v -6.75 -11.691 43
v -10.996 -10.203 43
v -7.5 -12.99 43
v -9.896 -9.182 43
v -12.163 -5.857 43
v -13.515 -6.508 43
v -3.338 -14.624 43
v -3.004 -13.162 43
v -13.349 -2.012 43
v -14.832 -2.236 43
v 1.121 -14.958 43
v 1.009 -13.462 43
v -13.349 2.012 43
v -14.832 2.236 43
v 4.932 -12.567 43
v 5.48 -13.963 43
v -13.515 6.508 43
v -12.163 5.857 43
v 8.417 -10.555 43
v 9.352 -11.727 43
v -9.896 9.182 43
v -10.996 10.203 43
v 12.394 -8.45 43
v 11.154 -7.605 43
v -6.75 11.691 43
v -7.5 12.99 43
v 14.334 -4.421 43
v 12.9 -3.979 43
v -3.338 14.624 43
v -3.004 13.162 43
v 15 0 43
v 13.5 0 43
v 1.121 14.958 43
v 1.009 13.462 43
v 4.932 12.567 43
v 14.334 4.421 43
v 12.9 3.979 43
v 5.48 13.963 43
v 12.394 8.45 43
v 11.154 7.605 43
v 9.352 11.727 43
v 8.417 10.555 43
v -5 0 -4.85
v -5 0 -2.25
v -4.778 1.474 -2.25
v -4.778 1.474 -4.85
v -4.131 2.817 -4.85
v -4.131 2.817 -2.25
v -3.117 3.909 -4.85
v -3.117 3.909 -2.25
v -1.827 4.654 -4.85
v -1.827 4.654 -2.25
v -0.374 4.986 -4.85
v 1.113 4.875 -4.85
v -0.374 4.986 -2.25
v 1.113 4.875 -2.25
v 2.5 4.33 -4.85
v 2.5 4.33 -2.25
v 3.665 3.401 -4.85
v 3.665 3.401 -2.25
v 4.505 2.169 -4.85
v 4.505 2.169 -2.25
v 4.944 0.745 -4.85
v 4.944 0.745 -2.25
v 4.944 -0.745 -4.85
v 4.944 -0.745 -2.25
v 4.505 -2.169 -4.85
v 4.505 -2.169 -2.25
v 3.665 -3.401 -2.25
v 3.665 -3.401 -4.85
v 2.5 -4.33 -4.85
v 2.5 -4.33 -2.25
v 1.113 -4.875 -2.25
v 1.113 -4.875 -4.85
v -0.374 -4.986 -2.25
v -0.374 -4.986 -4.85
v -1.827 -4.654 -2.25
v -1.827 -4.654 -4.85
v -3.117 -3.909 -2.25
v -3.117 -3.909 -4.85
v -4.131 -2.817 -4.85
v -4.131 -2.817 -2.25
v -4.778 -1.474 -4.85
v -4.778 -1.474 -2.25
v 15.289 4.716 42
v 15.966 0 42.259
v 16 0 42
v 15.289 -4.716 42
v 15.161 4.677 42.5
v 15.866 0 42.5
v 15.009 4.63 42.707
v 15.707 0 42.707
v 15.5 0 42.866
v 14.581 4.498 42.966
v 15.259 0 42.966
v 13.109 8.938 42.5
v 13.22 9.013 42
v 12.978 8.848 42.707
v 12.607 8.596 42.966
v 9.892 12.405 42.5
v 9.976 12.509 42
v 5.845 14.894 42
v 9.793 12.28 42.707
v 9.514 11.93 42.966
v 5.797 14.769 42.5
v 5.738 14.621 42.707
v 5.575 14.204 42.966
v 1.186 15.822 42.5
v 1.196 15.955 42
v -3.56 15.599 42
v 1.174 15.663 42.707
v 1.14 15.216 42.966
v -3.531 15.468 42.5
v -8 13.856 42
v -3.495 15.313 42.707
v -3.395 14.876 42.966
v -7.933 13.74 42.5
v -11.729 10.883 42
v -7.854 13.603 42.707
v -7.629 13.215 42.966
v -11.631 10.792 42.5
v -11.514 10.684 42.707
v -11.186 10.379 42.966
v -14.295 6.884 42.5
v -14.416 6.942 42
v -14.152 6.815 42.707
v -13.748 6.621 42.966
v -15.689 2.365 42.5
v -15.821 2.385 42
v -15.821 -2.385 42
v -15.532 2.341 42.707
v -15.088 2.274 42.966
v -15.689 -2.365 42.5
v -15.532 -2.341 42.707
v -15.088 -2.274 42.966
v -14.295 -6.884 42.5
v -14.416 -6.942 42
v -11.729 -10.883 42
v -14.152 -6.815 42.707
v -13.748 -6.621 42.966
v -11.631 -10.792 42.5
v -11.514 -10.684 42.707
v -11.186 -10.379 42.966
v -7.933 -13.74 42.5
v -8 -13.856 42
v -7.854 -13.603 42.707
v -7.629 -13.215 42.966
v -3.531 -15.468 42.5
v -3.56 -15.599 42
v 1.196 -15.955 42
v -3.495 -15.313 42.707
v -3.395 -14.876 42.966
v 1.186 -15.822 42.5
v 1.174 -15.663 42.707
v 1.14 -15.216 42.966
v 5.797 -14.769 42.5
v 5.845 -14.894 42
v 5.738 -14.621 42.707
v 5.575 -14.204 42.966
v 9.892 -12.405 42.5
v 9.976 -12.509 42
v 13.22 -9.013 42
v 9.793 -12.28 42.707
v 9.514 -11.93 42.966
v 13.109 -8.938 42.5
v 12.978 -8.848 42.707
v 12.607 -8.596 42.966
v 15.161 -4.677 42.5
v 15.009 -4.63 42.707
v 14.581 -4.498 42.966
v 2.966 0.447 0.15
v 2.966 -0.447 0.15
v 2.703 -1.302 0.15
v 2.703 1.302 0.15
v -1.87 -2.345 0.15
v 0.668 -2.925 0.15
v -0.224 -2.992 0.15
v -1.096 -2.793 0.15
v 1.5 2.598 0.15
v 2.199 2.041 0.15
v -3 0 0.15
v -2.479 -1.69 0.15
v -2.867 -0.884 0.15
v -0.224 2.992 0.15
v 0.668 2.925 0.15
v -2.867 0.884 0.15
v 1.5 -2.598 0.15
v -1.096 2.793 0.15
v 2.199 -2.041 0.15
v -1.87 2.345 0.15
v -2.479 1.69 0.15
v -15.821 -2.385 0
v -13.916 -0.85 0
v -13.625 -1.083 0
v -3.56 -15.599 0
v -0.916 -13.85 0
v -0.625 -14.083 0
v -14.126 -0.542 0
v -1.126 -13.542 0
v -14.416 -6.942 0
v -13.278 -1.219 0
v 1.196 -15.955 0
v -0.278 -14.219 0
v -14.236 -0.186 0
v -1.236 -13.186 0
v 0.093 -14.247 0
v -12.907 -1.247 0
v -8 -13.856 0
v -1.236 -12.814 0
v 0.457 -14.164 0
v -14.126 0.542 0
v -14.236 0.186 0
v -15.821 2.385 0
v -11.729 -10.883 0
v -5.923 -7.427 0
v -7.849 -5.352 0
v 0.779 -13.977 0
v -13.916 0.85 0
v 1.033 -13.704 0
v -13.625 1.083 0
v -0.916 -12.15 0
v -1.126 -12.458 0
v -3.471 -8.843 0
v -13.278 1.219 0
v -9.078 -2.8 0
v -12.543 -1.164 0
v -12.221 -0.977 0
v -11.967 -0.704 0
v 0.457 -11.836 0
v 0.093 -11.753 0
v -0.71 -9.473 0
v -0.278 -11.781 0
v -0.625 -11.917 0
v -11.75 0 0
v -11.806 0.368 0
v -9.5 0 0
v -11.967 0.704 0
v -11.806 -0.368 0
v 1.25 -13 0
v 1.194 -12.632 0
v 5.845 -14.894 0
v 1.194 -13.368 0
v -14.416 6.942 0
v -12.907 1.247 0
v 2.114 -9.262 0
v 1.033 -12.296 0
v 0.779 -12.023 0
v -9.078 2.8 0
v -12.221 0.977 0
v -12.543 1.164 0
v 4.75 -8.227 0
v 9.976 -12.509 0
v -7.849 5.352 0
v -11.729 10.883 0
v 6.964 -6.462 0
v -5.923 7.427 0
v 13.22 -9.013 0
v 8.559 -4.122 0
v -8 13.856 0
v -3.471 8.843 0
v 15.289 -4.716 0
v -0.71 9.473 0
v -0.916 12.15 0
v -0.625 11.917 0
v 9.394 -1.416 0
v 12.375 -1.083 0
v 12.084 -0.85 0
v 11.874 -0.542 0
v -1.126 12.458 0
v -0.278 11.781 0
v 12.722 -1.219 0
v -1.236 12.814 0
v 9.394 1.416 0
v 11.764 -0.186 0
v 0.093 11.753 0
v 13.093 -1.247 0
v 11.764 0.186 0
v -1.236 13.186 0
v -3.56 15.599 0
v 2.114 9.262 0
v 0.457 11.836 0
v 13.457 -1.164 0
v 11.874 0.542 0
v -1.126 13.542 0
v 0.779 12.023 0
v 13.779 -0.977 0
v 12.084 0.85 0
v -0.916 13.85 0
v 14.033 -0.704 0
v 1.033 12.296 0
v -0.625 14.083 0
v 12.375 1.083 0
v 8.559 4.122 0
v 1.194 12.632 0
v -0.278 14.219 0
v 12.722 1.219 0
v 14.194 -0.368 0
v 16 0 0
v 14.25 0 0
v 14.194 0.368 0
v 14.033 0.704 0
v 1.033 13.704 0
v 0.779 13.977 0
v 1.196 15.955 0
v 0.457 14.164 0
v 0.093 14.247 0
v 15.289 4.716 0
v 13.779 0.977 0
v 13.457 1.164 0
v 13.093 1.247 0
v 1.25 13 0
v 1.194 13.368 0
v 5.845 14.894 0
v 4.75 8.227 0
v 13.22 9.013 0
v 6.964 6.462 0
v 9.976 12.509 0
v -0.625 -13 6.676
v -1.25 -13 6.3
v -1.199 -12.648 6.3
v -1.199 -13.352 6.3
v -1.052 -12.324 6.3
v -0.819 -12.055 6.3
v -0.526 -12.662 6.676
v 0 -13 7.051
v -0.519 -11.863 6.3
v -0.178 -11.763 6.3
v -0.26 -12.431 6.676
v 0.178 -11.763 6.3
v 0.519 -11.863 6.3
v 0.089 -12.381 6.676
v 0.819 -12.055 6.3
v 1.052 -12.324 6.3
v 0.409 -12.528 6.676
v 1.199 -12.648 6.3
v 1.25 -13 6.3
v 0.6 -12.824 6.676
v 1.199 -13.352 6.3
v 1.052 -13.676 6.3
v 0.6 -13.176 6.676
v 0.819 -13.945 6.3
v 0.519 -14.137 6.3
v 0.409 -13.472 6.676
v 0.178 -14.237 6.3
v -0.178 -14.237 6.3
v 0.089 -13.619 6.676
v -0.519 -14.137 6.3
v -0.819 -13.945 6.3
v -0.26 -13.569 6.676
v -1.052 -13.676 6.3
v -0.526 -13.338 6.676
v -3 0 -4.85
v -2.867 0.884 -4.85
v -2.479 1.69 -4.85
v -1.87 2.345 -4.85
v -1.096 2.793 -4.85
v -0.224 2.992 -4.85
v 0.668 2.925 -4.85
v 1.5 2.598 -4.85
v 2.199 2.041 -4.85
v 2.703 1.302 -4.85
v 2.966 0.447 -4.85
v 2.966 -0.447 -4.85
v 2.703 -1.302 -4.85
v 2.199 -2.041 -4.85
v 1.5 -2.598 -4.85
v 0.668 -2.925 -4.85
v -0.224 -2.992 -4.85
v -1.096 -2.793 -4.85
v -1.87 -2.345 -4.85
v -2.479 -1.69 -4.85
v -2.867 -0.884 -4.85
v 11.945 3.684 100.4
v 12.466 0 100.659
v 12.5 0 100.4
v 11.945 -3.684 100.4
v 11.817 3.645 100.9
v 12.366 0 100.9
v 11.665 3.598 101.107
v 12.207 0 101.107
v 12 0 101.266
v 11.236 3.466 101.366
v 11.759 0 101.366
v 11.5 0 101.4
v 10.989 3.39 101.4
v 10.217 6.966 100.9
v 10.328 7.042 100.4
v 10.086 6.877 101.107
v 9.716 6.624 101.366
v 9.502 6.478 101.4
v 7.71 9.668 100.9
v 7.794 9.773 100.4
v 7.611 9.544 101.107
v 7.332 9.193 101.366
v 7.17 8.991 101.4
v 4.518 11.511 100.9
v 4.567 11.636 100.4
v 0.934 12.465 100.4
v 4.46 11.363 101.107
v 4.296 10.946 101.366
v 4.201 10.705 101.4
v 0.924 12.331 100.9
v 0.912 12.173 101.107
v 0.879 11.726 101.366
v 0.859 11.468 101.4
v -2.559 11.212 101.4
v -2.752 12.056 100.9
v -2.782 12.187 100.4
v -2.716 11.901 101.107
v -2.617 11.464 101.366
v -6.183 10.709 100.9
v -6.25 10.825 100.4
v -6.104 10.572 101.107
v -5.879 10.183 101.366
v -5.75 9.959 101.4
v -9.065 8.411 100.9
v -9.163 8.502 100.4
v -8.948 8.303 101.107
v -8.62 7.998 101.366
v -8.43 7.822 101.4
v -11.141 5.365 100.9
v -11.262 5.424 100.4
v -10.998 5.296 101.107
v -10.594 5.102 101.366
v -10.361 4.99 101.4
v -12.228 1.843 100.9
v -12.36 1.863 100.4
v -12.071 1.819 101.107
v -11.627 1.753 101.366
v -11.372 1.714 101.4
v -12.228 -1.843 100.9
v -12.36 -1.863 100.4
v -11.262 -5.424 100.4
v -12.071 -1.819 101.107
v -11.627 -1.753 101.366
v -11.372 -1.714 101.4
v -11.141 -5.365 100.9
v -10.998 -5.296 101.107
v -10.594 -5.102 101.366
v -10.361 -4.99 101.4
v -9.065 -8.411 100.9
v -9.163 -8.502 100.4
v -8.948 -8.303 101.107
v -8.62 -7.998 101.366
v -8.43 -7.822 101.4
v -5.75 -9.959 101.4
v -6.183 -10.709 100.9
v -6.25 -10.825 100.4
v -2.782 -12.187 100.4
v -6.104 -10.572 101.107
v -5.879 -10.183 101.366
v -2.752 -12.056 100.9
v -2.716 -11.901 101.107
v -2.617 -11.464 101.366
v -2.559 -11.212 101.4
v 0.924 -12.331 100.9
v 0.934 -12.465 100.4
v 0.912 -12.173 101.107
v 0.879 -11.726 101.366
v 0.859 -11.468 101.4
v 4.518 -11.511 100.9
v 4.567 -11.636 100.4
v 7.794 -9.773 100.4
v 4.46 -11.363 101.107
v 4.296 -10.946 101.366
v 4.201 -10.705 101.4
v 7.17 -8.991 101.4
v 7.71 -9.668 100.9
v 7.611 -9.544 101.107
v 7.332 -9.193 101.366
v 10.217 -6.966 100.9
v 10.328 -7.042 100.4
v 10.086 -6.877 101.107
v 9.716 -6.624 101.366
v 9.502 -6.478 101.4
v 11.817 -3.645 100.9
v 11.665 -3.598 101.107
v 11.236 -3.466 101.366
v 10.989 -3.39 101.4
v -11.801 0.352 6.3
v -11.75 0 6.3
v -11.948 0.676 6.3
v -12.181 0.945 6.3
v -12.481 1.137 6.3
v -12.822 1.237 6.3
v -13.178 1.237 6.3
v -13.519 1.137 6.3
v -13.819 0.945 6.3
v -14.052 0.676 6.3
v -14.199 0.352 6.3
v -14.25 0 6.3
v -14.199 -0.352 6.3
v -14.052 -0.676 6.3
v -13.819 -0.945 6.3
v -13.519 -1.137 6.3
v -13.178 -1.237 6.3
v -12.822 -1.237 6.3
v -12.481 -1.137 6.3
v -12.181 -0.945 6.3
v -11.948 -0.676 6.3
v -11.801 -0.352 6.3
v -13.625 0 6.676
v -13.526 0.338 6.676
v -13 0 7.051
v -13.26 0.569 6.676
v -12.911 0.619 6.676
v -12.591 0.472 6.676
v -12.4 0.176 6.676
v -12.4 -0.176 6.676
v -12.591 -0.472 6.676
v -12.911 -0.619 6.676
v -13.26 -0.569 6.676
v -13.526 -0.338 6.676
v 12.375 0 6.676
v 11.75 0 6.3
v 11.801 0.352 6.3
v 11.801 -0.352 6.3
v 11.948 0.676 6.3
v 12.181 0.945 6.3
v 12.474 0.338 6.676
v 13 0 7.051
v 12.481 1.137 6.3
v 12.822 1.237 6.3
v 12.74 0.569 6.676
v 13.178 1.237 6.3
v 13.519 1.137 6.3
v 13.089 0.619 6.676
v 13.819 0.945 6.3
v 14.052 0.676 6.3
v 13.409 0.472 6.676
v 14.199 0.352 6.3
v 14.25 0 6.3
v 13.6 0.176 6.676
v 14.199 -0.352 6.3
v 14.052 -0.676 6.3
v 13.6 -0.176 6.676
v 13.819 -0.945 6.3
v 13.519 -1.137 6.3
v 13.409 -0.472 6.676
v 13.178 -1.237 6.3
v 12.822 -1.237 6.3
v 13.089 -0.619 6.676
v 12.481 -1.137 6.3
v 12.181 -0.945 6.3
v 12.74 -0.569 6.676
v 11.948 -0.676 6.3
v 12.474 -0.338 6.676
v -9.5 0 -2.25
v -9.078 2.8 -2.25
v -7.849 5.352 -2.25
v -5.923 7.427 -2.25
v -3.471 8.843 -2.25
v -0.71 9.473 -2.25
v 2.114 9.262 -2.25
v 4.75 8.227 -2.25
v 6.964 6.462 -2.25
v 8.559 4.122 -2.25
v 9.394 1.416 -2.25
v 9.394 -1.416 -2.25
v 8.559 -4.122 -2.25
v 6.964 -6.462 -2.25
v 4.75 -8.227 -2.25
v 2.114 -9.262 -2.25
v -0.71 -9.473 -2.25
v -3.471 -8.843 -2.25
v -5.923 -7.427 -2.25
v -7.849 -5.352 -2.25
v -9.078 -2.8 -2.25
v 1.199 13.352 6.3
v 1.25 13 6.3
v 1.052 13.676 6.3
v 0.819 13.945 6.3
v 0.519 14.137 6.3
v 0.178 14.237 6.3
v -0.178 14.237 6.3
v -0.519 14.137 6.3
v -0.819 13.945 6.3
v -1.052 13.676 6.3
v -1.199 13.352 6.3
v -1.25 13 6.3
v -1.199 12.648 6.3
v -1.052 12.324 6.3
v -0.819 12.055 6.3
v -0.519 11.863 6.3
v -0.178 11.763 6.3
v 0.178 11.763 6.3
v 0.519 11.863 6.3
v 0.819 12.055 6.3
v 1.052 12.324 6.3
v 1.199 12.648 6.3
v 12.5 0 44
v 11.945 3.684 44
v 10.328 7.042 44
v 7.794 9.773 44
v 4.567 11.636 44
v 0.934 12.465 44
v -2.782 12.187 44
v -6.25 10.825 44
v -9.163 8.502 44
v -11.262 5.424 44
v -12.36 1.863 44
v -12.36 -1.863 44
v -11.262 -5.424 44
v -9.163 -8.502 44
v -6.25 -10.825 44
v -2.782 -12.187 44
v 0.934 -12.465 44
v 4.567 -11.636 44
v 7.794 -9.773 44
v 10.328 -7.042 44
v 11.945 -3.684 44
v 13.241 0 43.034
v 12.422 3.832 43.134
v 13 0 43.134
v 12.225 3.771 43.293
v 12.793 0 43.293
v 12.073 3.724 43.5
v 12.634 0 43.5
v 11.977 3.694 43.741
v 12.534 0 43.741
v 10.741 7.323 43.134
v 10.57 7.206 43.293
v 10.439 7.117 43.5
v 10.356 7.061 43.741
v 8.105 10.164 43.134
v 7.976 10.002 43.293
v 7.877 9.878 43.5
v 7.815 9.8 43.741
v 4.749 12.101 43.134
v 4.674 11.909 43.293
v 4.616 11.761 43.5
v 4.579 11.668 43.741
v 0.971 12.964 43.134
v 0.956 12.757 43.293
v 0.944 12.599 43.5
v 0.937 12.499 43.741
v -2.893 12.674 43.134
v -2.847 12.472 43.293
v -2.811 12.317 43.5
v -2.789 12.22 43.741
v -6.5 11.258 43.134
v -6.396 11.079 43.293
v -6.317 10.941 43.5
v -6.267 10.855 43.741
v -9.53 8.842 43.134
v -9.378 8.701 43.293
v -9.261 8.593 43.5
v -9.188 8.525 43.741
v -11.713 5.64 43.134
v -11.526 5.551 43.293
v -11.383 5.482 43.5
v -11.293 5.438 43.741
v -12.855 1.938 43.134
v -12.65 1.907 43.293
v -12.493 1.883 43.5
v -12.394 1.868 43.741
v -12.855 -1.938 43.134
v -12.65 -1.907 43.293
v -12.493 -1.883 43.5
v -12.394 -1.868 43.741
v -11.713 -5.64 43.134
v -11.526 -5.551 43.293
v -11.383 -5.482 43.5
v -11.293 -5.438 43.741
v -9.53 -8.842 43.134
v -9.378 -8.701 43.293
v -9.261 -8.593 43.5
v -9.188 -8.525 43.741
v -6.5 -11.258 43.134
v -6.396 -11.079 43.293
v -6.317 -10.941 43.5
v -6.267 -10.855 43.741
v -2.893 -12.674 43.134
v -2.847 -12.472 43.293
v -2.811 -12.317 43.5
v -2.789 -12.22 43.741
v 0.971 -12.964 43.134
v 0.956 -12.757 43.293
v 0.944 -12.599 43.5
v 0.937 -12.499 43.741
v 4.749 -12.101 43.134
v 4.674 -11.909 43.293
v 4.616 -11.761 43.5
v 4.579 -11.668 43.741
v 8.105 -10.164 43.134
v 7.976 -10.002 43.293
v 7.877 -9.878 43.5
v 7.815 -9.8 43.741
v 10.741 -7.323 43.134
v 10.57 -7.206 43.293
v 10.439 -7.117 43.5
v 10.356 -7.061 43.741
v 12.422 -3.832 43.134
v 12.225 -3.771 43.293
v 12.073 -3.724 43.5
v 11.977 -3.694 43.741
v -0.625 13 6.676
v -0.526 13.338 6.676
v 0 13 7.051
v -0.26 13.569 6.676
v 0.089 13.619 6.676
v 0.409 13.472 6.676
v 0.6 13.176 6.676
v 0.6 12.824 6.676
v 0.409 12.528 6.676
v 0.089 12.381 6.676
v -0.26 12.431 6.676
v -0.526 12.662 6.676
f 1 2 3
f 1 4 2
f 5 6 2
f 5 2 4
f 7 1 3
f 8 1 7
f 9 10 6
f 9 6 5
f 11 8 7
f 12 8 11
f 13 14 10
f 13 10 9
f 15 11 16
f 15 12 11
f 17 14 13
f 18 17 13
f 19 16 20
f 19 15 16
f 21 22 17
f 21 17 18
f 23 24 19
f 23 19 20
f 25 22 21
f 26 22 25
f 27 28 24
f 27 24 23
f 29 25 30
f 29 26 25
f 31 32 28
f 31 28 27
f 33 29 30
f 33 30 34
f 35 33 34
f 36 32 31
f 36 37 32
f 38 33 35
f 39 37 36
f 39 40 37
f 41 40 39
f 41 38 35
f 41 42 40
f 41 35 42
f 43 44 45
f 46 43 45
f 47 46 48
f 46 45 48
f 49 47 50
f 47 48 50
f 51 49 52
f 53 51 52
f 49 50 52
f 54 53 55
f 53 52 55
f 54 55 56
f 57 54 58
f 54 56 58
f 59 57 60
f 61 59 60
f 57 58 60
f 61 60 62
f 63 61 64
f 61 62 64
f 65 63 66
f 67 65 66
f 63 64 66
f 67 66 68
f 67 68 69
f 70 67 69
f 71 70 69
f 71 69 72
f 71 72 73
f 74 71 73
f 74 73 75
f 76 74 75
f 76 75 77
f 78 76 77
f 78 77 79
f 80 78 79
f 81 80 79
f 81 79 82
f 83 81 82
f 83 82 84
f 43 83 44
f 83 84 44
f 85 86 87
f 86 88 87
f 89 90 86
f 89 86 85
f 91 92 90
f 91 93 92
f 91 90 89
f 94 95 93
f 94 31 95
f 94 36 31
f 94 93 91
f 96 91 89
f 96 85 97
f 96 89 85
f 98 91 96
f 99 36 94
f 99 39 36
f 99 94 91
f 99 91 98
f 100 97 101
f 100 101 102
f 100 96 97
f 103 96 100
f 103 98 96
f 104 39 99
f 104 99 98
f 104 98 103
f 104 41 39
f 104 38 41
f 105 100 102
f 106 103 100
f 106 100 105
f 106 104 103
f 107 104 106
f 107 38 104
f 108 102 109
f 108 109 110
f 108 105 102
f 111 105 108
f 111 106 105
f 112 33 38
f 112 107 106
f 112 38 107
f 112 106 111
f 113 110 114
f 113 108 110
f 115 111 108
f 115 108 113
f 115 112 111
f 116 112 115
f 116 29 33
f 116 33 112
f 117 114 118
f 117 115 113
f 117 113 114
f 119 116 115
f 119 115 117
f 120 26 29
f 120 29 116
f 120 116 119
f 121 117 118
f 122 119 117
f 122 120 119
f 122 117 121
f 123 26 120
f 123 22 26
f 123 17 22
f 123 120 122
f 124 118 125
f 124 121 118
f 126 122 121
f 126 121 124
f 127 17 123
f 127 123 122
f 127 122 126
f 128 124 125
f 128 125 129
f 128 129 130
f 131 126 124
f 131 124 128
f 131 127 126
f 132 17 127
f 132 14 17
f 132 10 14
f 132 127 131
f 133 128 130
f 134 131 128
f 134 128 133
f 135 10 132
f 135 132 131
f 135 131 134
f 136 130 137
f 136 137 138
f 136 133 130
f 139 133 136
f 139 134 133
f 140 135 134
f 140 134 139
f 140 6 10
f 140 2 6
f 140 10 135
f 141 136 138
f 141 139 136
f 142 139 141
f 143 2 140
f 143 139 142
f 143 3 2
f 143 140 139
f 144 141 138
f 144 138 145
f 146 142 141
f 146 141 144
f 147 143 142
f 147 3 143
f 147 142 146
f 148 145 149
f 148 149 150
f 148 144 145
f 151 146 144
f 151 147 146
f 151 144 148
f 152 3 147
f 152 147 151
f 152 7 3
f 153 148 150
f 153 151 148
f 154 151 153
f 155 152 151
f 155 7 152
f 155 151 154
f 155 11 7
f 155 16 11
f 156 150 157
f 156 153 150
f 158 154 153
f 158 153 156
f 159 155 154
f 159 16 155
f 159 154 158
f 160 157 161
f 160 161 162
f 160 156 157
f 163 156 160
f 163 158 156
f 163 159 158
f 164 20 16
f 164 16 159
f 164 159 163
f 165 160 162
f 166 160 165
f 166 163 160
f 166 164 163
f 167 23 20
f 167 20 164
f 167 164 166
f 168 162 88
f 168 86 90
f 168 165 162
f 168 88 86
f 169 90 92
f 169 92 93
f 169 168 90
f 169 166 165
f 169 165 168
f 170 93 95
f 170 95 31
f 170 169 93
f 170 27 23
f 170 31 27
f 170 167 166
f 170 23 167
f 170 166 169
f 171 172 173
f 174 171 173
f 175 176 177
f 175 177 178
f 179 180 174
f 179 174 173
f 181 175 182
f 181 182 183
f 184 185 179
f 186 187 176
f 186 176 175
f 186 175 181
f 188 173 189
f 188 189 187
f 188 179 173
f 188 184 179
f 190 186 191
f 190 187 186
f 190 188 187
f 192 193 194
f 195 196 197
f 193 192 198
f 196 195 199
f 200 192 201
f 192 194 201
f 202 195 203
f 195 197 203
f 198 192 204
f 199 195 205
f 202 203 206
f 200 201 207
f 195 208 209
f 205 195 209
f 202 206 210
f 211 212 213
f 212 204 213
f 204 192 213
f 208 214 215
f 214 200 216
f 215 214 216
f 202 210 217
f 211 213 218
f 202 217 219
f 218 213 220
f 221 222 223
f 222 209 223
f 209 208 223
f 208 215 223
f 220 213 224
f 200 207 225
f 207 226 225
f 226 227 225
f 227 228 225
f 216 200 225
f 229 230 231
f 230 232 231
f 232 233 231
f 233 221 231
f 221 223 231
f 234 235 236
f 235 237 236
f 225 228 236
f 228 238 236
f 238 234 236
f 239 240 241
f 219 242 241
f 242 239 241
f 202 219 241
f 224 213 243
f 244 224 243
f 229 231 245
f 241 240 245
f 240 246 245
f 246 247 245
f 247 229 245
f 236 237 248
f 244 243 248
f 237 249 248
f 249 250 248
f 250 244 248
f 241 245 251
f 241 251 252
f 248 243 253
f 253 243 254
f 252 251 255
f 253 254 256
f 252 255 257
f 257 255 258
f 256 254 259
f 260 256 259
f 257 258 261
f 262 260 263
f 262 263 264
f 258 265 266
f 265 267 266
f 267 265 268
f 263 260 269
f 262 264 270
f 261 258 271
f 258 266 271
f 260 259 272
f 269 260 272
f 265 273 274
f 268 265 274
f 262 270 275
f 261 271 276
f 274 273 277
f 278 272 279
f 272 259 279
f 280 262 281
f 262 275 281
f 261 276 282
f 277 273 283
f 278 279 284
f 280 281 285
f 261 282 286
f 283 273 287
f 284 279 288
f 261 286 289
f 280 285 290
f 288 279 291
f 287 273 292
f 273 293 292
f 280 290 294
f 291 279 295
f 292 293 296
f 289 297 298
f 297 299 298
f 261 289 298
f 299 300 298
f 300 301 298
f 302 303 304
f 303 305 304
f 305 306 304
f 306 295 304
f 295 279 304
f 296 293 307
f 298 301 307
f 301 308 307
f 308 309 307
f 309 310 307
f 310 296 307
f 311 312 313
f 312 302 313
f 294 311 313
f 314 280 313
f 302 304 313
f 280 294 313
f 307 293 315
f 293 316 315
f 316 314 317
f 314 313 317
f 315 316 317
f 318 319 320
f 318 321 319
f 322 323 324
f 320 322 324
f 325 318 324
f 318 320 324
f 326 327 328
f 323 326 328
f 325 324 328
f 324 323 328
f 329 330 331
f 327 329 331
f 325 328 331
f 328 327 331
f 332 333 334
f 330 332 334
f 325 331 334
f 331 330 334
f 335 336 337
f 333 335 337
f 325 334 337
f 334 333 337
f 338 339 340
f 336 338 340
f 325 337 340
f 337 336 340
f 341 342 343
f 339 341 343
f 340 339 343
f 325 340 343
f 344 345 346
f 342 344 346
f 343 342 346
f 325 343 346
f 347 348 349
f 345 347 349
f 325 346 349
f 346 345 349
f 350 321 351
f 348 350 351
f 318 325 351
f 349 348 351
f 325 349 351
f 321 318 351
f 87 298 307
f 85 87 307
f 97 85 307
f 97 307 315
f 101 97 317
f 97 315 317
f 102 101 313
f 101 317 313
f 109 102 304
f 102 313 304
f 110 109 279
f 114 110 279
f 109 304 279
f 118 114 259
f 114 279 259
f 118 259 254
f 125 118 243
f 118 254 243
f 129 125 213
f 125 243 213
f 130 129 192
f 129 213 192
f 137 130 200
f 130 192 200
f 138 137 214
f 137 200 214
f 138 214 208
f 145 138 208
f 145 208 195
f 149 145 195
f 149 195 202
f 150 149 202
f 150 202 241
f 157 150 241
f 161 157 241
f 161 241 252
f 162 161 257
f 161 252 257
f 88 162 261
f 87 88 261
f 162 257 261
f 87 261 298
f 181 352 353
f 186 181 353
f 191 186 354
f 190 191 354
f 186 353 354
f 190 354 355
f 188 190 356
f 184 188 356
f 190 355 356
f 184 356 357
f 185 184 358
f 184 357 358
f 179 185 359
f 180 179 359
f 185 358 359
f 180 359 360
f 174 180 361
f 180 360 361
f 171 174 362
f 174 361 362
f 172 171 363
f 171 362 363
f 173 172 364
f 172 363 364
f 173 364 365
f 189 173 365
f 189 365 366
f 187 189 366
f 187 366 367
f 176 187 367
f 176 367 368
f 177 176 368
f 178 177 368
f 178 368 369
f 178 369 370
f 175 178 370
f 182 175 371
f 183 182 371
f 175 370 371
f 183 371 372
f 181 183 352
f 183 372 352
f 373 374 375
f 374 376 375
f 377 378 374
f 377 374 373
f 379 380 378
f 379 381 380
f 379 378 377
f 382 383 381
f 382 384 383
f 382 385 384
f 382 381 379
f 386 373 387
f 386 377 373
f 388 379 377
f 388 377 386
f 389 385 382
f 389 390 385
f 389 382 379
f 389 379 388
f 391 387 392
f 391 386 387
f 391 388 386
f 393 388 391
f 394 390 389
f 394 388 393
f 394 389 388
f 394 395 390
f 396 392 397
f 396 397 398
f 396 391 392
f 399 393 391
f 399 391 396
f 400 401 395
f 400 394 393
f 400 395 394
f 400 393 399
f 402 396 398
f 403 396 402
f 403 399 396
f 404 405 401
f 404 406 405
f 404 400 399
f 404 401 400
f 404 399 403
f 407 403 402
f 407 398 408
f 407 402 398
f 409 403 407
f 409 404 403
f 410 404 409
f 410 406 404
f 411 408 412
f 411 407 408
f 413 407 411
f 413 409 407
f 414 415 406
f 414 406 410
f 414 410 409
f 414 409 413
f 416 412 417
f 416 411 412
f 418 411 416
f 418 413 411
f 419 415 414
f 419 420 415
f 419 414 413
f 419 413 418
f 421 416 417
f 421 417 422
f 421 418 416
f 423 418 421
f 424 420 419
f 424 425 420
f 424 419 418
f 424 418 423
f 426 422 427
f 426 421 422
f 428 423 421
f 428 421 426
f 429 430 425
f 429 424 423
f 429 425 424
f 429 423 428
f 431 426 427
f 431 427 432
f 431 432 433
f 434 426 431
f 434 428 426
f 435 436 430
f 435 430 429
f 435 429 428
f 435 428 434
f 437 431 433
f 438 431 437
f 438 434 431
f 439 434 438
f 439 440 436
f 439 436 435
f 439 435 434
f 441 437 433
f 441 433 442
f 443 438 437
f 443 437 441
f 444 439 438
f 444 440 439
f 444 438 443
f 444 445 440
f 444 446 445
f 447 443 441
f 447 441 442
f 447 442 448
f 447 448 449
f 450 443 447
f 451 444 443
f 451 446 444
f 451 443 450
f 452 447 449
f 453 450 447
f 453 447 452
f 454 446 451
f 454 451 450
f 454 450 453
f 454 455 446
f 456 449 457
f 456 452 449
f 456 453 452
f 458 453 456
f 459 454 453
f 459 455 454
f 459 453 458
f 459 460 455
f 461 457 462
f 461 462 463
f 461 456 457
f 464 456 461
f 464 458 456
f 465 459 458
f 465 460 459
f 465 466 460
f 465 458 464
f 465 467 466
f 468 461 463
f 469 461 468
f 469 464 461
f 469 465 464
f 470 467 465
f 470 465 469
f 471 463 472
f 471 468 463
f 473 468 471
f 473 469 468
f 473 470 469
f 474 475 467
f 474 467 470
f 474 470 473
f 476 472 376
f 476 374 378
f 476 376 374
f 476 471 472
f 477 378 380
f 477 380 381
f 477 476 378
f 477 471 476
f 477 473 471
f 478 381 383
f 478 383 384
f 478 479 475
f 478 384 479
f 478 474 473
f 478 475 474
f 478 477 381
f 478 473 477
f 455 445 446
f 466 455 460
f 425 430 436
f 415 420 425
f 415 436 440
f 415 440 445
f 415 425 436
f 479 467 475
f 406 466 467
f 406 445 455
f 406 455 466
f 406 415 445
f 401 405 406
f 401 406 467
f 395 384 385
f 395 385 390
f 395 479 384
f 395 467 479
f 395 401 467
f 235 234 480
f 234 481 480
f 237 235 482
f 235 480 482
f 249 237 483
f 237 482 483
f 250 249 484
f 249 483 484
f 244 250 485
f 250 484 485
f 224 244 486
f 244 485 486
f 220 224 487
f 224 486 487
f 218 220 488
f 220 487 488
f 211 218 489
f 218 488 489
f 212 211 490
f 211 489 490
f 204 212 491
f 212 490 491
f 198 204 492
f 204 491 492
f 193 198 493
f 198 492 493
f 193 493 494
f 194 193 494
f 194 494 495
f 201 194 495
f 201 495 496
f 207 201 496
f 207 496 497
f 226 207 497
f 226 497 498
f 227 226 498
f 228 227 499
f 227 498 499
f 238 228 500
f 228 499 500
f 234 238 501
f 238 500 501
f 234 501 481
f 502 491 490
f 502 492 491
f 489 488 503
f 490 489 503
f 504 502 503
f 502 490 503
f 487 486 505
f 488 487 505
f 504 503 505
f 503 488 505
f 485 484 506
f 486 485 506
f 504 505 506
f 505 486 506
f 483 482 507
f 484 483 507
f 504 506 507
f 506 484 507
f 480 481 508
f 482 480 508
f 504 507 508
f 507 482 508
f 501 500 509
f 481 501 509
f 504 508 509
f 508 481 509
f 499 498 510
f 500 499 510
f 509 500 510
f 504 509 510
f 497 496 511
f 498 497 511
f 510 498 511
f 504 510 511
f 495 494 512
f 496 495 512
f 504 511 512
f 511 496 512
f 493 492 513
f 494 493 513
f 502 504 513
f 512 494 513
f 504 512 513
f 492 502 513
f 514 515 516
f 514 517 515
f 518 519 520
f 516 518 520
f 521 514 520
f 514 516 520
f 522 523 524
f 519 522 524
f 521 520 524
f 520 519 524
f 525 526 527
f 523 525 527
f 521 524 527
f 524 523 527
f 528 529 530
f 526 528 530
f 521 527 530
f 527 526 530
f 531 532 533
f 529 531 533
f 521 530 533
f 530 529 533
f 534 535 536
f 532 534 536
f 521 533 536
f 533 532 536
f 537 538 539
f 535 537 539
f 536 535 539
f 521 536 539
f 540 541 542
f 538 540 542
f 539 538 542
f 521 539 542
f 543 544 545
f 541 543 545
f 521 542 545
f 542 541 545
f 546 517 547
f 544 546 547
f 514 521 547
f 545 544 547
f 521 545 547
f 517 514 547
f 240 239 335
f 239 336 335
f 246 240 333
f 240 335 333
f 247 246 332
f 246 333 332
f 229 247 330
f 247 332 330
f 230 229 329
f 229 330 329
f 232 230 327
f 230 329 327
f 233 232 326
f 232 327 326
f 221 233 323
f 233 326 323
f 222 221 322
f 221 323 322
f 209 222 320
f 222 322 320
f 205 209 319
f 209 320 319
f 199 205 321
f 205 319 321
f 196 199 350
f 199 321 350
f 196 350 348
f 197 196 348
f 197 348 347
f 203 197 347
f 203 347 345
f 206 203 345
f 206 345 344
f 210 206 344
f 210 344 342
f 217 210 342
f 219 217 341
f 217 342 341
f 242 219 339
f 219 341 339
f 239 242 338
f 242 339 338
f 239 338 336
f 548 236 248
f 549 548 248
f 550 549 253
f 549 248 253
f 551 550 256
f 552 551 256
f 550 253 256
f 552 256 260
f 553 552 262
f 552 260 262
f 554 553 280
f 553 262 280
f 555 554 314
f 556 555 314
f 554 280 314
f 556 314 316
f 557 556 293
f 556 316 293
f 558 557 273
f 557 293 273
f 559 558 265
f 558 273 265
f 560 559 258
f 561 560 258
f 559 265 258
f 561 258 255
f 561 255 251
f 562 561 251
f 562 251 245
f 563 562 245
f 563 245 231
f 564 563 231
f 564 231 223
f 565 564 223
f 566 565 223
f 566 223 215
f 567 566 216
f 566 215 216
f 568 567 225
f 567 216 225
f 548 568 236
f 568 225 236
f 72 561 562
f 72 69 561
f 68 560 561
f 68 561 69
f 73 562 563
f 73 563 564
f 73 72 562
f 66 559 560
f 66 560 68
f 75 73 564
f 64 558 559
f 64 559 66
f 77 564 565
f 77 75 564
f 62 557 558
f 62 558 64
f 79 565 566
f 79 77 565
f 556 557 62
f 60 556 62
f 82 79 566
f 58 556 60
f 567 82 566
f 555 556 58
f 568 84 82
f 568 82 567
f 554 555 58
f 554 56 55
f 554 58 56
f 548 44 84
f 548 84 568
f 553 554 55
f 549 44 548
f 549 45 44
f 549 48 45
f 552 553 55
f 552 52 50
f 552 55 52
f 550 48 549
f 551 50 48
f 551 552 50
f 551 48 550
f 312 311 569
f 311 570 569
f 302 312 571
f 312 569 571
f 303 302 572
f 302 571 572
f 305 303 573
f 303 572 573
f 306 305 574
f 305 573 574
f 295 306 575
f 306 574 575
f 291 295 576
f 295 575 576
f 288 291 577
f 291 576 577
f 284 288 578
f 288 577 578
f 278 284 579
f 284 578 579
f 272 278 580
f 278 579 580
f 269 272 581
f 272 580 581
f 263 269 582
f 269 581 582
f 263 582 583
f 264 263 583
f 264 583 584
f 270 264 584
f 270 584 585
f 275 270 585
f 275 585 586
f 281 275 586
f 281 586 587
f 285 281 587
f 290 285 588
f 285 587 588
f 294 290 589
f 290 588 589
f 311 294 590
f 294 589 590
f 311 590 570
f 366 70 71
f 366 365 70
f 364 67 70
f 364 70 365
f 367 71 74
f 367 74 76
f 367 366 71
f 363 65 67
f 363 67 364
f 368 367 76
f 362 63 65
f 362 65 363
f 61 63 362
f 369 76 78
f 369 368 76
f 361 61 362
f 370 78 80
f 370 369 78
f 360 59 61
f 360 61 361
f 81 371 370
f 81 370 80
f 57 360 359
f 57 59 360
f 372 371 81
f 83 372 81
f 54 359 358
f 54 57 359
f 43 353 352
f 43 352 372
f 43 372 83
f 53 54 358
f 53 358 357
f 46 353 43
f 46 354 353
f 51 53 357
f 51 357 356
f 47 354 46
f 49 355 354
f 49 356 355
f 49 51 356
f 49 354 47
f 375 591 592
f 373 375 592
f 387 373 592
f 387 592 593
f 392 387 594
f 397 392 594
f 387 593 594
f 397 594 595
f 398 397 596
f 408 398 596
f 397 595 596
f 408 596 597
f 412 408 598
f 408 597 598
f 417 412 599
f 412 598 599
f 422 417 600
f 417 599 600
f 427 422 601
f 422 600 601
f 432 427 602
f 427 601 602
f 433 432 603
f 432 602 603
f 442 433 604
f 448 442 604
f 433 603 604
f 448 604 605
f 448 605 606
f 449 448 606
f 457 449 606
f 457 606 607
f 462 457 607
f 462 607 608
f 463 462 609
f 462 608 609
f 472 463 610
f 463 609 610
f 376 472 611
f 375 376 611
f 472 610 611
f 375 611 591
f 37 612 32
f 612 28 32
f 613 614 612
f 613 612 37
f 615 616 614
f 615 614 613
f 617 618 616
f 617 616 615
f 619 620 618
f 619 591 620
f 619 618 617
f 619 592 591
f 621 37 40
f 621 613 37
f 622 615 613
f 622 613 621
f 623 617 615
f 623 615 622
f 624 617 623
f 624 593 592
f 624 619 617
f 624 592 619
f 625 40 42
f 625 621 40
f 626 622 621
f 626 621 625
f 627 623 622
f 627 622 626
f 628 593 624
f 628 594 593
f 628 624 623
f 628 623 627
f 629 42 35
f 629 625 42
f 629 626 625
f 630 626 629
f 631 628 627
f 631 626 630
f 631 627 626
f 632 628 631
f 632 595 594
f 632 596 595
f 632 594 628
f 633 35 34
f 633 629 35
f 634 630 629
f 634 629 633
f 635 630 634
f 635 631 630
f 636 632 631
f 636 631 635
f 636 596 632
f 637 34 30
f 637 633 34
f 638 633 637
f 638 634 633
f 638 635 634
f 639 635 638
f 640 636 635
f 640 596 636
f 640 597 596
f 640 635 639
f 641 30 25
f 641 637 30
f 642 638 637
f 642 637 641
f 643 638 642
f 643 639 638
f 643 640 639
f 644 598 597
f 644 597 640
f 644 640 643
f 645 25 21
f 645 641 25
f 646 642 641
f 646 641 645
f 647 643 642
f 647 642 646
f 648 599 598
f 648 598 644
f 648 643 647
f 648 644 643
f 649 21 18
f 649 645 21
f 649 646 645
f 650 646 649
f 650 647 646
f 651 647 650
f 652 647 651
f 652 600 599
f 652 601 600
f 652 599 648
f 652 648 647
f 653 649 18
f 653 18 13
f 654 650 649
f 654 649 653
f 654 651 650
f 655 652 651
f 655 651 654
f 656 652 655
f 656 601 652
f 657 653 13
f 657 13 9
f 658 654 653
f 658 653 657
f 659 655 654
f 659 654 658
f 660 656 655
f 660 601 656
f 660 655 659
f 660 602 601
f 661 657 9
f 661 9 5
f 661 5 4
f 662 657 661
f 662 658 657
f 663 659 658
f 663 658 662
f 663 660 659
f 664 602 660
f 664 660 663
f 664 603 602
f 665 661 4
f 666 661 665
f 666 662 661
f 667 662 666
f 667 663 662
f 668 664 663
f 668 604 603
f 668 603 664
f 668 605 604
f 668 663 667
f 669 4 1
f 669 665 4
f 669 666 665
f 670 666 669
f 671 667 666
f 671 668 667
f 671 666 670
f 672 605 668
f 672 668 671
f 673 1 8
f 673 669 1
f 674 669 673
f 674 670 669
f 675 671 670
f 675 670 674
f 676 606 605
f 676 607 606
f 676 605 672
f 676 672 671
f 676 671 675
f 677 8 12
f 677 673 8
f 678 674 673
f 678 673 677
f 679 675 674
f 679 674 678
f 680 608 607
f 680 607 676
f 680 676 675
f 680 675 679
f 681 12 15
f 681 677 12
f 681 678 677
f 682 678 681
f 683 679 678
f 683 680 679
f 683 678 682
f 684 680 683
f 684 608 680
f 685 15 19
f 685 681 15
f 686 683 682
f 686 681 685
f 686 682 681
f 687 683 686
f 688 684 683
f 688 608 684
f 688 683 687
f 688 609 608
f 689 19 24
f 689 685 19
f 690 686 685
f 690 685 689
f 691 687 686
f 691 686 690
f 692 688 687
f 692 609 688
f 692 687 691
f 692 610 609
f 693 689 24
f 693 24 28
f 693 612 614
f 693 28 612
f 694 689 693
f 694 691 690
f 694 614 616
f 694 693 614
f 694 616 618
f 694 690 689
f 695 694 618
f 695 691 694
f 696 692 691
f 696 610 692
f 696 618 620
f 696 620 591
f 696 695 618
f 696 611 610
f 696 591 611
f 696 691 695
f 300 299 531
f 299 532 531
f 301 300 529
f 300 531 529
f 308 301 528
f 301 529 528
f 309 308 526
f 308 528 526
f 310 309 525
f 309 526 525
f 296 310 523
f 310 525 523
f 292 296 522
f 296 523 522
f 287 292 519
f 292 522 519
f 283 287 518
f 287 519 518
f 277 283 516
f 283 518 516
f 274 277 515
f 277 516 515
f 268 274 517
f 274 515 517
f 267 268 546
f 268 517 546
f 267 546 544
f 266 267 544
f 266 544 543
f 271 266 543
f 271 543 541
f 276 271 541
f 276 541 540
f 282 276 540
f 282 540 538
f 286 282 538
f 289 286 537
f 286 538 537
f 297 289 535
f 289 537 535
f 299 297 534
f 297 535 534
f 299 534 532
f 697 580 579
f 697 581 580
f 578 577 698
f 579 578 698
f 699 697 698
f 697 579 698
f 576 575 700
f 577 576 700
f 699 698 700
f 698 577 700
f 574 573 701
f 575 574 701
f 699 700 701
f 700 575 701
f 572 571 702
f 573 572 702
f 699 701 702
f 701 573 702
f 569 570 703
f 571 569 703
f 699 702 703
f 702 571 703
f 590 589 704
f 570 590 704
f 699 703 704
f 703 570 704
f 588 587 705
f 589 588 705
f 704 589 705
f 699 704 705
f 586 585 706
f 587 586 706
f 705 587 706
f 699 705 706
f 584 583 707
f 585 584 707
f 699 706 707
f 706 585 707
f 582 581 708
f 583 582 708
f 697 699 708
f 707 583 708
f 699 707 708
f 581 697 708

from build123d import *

# Parameters (mm, degrees)
SKETCH1_R                 = 16
BOSS_EXTRUDE1_DEPTH       = 43
SKETCH2_R                 = 12.5
BOSS_EXTRUDE2_DEPTH       = 58.4
SKETCH3_R                 = 9.5
BOSS_EXTRUDE3_DEPTH       = 2.25
SKETCH4_R                 = 5
BOSS_EXTRUDE4_DEPTH       = 2.6
SKETCH5_R                 = 3
CUT_EXTRUDE1_DEPTH        = 5
FILLET1_R                 = 1
M3X0_5_TAPPED_HOLE1_D     = 2.5
M3X0_5_TAPPED_HOLE1_DEPTH = 6.3
M3X0_5_TAPPED_HOLE1_TIP   = 0.751075774


with BuildPart() as part:
    # Sketch1 → Boss-Extrude1 (new body)
    with BuildSketch(Plane.XY):
        Circle(SKETCH1_R)
    extrude(amount=BOSS_EXTRUDE1_DEPTH)

    # Sketch2 → Boss-Extrude2 (add)
    with BuildSketch(Plane.XY.offset(43)):
        Circle(SKETCH2_R)
    extrude(amount=BOSS_EXTRUDE2_DEPTH)

    # Sketch3 → Boss-Extrude3 (add)
    with BuildSketch(Plane(origin=(0, 0, 0), x_dir=(-1, 0, 0), z_dir=(0, 0, -1))):
        Circle(SKETCH3_R)
    extrude(amount=BOSS_EXTRUDE3_DEPTH)

    # Sketch4 → Boss-Extrude4 (add)
    with BuildSketch(Plane(origin=(0, 0, -2.25), x_dir=(-1, 0, 0), z_dir=(0, 0, -1))):
        Circle(SKETCH4_R)
    extrude(amount=BOSS_EXTRUDE4_DEPTH)

    # Sketch5 → Cut-Extrude1 (cut)
    with BuildSketch(Plane(origin=(0, 0, -4.85), x_dir=(-1, 0, 0), z_dir=(0, 0, -1))):
        Circle(SKETCH5_R)
    extrude(amount=-CUT_EXTRUDE1_DEPTH, mode=Mode.SUBTRACT)

    # Fillet1
    fillet1_edges = [part.edges().sort_by_distance(p)[0] for p in [
        (-16, 0, 43),
        (-12.5, 0, 43),
        (-12.5, 0, 101.4),
    ]]
    fillet(fillet1_edges, radius=FILLET1_R)

    # M3x0.5 Tapped Hole1
    with Locations(Plane(origin=(0, 0, 0), x_dir=(-1, 0, 0), z_dir=(0, 0, -1))):
        with Locations((0, 13), (-13, 0), (0, -13), (13, 0)):
            Hole(M3X0_5_TAPPED_HOLE1_D / 2, depth=M3X0_5_TAPPED_HOLE1_DEPTH)
            with Locations((0, 0, -(M3X0_5_TAPPED_HOLE1_DEPTH + M3X0_5_TAPPED_HOLE1_TIP / 2))):  # 118° drill point
                Cone(0, M3X0_5_TAPPED_HOLE1_D / 2, M3X0_5_TAPPED_HOLE1_TIP, mode=Mode.SUBTRACT)


solid = part.part
